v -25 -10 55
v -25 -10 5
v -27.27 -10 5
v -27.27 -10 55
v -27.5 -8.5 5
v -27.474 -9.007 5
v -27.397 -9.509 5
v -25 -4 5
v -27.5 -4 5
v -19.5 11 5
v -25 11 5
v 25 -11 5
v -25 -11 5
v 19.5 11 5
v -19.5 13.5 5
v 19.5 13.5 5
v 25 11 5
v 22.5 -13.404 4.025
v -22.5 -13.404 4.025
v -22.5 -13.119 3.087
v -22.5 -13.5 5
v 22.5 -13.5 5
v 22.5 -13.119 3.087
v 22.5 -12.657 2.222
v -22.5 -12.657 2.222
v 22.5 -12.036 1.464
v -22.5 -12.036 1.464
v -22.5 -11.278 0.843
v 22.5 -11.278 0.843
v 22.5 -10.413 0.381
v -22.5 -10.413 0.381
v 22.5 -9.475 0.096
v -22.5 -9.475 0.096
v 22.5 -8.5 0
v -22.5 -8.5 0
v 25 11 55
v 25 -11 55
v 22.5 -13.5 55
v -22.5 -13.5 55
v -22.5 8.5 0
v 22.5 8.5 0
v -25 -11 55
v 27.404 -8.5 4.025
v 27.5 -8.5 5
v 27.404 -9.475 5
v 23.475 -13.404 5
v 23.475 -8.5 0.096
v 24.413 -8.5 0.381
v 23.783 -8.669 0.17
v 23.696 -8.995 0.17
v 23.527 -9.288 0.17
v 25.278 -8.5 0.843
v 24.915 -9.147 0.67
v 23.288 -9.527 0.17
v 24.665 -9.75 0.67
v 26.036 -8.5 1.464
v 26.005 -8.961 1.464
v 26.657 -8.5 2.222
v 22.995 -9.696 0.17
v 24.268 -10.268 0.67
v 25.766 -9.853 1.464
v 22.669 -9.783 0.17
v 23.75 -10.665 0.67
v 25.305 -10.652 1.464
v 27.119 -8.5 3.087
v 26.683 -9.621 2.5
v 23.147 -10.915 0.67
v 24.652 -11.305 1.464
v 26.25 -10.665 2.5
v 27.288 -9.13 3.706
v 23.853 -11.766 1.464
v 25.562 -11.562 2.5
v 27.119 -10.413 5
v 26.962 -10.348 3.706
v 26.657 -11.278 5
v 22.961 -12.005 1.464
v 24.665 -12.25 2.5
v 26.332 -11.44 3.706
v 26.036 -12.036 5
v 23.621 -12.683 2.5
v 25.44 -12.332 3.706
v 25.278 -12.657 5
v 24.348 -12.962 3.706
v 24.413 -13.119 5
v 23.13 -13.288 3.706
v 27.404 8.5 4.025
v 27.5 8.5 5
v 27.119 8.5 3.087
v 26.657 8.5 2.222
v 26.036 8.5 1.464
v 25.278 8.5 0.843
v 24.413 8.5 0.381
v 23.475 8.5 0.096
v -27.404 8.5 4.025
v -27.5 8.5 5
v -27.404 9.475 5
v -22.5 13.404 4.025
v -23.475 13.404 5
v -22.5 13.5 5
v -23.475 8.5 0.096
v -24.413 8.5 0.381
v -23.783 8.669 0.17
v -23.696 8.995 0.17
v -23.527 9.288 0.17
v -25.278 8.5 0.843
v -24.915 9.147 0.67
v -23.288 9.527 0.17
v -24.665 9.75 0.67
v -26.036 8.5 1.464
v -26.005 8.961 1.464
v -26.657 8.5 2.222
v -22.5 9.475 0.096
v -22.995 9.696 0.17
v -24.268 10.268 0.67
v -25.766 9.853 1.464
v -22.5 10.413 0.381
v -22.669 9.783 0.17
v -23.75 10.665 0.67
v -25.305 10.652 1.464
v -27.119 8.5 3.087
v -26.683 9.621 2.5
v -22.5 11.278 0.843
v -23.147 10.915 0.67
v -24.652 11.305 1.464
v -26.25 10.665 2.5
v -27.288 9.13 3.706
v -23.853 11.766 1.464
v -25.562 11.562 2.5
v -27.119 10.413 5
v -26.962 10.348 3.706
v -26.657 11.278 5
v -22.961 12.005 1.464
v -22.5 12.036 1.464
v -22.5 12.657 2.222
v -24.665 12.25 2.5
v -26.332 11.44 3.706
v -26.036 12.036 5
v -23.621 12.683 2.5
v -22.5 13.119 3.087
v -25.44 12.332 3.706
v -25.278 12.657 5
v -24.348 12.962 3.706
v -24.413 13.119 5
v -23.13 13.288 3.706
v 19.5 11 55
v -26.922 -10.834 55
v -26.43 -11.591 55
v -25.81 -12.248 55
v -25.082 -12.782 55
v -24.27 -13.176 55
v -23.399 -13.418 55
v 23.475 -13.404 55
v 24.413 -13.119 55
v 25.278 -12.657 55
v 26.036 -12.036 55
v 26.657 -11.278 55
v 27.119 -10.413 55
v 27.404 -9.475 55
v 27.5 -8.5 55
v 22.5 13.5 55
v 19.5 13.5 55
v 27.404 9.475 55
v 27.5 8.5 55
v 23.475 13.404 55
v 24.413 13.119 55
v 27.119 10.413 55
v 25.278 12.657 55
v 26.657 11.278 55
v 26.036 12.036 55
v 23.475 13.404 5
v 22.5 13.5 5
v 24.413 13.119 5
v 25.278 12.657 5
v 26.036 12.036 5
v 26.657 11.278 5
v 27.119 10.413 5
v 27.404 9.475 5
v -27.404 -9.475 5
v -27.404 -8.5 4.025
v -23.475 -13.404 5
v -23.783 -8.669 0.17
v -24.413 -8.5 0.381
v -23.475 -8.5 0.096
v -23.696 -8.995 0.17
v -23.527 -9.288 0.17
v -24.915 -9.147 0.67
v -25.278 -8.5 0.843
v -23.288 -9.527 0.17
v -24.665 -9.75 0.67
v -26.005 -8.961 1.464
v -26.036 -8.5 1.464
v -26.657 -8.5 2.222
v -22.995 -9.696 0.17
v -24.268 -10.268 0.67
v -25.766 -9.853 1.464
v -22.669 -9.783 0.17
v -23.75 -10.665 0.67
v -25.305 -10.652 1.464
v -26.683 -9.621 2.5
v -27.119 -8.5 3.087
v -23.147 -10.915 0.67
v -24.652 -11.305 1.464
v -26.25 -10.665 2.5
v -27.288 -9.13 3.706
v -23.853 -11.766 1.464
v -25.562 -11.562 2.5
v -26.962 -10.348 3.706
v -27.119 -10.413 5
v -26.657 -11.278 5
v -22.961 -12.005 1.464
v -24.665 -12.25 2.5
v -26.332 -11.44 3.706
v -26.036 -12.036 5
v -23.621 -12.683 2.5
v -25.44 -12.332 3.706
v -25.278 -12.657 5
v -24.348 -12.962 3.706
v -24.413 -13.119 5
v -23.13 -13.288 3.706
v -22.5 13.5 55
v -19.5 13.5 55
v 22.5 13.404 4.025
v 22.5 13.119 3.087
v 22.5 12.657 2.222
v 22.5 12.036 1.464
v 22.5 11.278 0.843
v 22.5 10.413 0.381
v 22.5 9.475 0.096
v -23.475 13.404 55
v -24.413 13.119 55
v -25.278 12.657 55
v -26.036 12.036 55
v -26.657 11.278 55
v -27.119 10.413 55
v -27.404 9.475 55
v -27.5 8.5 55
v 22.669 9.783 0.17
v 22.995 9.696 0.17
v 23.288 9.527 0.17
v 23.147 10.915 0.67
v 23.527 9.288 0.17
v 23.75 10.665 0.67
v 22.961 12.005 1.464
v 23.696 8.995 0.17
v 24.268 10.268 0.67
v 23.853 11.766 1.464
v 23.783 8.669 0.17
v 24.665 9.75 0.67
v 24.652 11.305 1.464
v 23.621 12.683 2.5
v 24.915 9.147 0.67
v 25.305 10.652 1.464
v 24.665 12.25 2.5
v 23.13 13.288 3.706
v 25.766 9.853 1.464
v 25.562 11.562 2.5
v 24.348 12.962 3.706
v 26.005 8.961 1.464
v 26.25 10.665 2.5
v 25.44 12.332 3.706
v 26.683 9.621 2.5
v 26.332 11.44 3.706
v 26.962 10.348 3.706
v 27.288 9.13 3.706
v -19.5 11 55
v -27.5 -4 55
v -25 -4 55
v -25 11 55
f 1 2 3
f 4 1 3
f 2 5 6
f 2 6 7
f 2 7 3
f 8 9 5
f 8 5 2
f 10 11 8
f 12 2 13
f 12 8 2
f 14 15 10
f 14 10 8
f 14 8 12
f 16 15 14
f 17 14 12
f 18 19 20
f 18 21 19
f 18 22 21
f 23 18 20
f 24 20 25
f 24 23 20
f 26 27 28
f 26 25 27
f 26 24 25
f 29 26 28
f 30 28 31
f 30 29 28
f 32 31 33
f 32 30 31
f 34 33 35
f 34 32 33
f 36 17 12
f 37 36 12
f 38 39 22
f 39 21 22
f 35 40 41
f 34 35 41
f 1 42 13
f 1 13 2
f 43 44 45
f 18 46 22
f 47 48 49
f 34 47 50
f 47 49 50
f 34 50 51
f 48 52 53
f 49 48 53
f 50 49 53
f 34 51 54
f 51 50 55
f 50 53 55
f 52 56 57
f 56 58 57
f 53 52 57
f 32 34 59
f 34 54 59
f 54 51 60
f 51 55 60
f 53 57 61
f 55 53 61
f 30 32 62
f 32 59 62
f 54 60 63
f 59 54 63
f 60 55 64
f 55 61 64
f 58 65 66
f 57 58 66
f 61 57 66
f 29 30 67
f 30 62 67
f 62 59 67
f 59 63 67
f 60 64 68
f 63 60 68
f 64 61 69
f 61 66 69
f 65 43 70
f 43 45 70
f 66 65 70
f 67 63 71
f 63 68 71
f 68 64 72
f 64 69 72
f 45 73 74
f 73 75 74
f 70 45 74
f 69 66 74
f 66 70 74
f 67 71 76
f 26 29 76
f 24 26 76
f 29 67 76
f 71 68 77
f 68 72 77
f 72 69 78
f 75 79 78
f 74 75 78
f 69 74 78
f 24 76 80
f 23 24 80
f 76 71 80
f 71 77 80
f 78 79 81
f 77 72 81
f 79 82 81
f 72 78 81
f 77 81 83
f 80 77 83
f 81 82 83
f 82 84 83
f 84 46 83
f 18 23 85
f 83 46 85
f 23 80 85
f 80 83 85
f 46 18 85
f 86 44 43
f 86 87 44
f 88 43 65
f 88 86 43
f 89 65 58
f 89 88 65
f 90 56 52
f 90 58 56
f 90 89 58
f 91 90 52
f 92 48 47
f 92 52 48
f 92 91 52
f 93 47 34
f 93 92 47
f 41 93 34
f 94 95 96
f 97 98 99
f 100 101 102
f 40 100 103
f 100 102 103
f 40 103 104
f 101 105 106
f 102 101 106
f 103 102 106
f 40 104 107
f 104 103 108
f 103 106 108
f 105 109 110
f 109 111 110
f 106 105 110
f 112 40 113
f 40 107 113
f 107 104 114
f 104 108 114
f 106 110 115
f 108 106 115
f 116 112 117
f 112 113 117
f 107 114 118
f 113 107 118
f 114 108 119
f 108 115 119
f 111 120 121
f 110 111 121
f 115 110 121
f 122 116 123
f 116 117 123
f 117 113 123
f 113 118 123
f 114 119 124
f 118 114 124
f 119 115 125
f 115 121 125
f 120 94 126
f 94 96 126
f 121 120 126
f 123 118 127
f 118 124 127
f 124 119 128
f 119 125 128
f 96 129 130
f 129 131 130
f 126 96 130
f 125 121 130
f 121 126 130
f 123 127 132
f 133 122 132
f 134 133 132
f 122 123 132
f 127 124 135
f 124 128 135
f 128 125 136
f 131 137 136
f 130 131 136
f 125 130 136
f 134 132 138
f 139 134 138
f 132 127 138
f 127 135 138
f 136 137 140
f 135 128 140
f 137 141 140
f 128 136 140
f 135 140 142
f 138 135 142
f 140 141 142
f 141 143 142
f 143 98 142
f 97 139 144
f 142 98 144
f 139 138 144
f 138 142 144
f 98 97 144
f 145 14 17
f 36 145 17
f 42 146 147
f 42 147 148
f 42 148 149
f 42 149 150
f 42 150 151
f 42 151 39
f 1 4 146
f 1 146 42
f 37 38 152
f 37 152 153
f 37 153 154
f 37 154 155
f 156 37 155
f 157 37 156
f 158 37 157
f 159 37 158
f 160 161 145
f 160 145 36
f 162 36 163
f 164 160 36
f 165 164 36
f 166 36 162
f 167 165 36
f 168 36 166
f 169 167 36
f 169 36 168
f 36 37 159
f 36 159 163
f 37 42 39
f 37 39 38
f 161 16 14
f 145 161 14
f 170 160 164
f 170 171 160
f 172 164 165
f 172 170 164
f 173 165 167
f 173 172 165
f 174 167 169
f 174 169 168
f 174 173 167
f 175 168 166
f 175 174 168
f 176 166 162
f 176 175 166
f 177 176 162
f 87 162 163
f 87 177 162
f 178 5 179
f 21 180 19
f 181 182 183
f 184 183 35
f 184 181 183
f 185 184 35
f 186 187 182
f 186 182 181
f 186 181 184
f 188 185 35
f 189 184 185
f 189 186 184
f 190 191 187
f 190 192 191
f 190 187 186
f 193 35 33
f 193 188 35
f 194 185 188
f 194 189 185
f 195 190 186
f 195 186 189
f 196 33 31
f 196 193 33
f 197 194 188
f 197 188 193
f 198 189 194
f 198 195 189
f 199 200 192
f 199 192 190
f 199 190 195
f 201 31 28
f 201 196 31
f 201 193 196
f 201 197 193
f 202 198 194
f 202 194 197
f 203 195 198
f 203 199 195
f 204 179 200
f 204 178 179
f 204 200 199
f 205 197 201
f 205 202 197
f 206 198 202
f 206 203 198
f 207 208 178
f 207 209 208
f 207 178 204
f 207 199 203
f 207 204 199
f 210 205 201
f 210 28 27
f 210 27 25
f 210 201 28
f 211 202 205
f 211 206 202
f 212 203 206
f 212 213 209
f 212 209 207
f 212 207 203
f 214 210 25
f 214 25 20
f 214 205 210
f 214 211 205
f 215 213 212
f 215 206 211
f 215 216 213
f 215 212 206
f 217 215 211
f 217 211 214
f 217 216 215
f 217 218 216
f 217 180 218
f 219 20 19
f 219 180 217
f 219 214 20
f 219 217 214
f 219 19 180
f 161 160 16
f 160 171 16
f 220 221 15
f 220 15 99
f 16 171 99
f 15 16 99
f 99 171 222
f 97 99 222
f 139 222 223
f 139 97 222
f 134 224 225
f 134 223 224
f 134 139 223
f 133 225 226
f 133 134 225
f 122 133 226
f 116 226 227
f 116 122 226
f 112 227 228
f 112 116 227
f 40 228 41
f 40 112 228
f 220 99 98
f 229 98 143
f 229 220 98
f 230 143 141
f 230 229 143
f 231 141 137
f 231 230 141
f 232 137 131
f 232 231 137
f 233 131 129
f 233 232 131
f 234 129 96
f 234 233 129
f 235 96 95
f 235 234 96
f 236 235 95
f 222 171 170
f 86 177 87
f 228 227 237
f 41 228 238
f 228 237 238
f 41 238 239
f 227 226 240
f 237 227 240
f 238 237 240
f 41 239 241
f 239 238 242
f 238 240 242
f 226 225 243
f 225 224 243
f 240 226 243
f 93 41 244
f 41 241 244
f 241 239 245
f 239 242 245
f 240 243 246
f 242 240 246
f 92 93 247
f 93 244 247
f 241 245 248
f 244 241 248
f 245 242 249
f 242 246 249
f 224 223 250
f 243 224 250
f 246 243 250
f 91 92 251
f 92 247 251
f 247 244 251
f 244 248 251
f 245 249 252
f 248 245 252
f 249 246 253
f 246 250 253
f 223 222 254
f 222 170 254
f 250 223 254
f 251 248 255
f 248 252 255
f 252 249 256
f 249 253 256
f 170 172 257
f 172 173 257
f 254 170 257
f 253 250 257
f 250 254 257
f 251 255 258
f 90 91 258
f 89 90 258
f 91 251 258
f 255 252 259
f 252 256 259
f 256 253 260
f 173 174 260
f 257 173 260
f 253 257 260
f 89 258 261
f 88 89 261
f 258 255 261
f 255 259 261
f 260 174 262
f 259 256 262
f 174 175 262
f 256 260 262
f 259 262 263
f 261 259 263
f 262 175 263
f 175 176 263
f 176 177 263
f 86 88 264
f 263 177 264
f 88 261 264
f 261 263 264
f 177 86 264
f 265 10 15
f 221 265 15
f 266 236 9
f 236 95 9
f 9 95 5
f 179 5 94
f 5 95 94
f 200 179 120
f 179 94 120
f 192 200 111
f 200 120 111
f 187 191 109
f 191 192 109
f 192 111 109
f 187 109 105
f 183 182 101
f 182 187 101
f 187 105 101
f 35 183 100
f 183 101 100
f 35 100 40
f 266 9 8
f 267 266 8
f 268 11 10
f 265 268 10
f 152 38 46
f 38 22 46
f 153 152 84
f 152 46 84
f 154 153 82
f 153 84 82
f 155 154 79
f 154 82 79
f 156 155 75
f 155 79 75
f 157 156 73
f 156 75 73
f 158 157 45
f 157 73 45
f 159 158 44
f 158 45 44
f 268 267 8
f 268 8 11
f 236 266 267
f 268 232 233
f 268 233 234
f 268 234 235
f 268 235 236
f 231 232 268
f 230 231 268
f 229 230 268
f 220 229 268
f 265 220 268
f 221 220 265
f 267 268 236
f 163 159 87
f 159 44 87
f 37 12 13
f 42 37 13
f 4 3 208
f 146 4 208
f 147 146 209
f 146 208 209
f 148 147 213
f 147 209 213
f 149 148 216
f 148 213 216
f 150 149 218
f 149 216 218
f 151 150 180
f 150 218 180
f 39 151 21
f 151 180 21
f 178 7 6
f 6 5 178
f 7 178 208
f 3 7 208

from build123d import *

# Parameters (mm, degrees)
F0_W     = 39
F0_H     = 7.6218599584
F0_H_2   = 2.5
F0_W_2   = 6.4553316683
F0_H_3   = 6
F0_W_3   = 2.5
F1_DEPTH = 5
F2_DEPTH = 55
F3_R     = 4.99999


# Not quite as in the source:
# - a fillet or chamfer is up to 0.001 mm smaller than in the source, because OpenCascade refuses the exact size


with BuildPart() as f1:
    # F0 (on Top) → F1 (new body)
    with BuildSketch(Plane.XY):
        Polygon((27.5, 13.5), (19.5, 13.5), (19.5, 11), (25, 11), (25, -11), (-25, -11), (-25, -10), (-27.5, -10), (-27.5, -13.5), (27.5, -13.5), align=None)
        Polygon((-19.5, 13.5), (-27.5, 13.5), (-27.5, -4), (-25, -4), (-25, 11), (-19.5, 11), align=None)
        Polygon((-19.5, 3.3781400416), (-19.5, 11), (-25, 11), (-25, -4), (-18.5446683317, -4), (-18.5446683317, -10), (-25, -10), (-25, -11), (25, -11), (25, 11), (19.5, 11), (19.5, 3.3781400416), align=None)
        with Locations((0, 7.1890700208)):
            Rectangle(F0_W, F0_H)
        with Locations((0, 12.25)):
            Rectangle(F0_W, F0_H_2)
        with Locations((-21.7723341659, -7)):
            Rectangle(F0_W_2, F0_H_3)
        with Locations((-26.25, -7)):
            Rectangle(F0_W_3, F0_H_3)
    extrude(amount=F1_DEPTH)

    # F0 (on Top) → F2 (join)
    with BuildSketch(Plane.XY):
        Polygon((27.5, 13.5), (19.5, 13.5), (19.5, 11), (25, 11), (25, -11), (-25, -11), (-25, -10), (-27.5, -10), (-27.5, -13.5), (27.5, -13.5), align=None)
        Polygon((-19.5, 13.5), (-27.5, 13.5), (-27.5, -4), (-25, -4), (-25, 11), (-19.5, 11), align=None)
    extrude(amount=F2_DEPTH)

    # F3 (radius 5 in the source; OpenCascade refuses exactly that, so slightly less here)
    f3_edges = [f1.edges().sort_by_distance(p)[0] for p in [
        (27.5, 13.5, 27.5),
        (-27.5, 13.5, 27.5),
        (-27.5, -13.5, 27.5),
        (27.5, -13.5, 27.5),
        (-27.5, 0, 0),
        (0, 13.5, 0),
        (27.5, 0, 0),
        (0, -13.5, 0),
    ]]
    fillet(f3_edges, radius=F3_R)


solid = f1.part
